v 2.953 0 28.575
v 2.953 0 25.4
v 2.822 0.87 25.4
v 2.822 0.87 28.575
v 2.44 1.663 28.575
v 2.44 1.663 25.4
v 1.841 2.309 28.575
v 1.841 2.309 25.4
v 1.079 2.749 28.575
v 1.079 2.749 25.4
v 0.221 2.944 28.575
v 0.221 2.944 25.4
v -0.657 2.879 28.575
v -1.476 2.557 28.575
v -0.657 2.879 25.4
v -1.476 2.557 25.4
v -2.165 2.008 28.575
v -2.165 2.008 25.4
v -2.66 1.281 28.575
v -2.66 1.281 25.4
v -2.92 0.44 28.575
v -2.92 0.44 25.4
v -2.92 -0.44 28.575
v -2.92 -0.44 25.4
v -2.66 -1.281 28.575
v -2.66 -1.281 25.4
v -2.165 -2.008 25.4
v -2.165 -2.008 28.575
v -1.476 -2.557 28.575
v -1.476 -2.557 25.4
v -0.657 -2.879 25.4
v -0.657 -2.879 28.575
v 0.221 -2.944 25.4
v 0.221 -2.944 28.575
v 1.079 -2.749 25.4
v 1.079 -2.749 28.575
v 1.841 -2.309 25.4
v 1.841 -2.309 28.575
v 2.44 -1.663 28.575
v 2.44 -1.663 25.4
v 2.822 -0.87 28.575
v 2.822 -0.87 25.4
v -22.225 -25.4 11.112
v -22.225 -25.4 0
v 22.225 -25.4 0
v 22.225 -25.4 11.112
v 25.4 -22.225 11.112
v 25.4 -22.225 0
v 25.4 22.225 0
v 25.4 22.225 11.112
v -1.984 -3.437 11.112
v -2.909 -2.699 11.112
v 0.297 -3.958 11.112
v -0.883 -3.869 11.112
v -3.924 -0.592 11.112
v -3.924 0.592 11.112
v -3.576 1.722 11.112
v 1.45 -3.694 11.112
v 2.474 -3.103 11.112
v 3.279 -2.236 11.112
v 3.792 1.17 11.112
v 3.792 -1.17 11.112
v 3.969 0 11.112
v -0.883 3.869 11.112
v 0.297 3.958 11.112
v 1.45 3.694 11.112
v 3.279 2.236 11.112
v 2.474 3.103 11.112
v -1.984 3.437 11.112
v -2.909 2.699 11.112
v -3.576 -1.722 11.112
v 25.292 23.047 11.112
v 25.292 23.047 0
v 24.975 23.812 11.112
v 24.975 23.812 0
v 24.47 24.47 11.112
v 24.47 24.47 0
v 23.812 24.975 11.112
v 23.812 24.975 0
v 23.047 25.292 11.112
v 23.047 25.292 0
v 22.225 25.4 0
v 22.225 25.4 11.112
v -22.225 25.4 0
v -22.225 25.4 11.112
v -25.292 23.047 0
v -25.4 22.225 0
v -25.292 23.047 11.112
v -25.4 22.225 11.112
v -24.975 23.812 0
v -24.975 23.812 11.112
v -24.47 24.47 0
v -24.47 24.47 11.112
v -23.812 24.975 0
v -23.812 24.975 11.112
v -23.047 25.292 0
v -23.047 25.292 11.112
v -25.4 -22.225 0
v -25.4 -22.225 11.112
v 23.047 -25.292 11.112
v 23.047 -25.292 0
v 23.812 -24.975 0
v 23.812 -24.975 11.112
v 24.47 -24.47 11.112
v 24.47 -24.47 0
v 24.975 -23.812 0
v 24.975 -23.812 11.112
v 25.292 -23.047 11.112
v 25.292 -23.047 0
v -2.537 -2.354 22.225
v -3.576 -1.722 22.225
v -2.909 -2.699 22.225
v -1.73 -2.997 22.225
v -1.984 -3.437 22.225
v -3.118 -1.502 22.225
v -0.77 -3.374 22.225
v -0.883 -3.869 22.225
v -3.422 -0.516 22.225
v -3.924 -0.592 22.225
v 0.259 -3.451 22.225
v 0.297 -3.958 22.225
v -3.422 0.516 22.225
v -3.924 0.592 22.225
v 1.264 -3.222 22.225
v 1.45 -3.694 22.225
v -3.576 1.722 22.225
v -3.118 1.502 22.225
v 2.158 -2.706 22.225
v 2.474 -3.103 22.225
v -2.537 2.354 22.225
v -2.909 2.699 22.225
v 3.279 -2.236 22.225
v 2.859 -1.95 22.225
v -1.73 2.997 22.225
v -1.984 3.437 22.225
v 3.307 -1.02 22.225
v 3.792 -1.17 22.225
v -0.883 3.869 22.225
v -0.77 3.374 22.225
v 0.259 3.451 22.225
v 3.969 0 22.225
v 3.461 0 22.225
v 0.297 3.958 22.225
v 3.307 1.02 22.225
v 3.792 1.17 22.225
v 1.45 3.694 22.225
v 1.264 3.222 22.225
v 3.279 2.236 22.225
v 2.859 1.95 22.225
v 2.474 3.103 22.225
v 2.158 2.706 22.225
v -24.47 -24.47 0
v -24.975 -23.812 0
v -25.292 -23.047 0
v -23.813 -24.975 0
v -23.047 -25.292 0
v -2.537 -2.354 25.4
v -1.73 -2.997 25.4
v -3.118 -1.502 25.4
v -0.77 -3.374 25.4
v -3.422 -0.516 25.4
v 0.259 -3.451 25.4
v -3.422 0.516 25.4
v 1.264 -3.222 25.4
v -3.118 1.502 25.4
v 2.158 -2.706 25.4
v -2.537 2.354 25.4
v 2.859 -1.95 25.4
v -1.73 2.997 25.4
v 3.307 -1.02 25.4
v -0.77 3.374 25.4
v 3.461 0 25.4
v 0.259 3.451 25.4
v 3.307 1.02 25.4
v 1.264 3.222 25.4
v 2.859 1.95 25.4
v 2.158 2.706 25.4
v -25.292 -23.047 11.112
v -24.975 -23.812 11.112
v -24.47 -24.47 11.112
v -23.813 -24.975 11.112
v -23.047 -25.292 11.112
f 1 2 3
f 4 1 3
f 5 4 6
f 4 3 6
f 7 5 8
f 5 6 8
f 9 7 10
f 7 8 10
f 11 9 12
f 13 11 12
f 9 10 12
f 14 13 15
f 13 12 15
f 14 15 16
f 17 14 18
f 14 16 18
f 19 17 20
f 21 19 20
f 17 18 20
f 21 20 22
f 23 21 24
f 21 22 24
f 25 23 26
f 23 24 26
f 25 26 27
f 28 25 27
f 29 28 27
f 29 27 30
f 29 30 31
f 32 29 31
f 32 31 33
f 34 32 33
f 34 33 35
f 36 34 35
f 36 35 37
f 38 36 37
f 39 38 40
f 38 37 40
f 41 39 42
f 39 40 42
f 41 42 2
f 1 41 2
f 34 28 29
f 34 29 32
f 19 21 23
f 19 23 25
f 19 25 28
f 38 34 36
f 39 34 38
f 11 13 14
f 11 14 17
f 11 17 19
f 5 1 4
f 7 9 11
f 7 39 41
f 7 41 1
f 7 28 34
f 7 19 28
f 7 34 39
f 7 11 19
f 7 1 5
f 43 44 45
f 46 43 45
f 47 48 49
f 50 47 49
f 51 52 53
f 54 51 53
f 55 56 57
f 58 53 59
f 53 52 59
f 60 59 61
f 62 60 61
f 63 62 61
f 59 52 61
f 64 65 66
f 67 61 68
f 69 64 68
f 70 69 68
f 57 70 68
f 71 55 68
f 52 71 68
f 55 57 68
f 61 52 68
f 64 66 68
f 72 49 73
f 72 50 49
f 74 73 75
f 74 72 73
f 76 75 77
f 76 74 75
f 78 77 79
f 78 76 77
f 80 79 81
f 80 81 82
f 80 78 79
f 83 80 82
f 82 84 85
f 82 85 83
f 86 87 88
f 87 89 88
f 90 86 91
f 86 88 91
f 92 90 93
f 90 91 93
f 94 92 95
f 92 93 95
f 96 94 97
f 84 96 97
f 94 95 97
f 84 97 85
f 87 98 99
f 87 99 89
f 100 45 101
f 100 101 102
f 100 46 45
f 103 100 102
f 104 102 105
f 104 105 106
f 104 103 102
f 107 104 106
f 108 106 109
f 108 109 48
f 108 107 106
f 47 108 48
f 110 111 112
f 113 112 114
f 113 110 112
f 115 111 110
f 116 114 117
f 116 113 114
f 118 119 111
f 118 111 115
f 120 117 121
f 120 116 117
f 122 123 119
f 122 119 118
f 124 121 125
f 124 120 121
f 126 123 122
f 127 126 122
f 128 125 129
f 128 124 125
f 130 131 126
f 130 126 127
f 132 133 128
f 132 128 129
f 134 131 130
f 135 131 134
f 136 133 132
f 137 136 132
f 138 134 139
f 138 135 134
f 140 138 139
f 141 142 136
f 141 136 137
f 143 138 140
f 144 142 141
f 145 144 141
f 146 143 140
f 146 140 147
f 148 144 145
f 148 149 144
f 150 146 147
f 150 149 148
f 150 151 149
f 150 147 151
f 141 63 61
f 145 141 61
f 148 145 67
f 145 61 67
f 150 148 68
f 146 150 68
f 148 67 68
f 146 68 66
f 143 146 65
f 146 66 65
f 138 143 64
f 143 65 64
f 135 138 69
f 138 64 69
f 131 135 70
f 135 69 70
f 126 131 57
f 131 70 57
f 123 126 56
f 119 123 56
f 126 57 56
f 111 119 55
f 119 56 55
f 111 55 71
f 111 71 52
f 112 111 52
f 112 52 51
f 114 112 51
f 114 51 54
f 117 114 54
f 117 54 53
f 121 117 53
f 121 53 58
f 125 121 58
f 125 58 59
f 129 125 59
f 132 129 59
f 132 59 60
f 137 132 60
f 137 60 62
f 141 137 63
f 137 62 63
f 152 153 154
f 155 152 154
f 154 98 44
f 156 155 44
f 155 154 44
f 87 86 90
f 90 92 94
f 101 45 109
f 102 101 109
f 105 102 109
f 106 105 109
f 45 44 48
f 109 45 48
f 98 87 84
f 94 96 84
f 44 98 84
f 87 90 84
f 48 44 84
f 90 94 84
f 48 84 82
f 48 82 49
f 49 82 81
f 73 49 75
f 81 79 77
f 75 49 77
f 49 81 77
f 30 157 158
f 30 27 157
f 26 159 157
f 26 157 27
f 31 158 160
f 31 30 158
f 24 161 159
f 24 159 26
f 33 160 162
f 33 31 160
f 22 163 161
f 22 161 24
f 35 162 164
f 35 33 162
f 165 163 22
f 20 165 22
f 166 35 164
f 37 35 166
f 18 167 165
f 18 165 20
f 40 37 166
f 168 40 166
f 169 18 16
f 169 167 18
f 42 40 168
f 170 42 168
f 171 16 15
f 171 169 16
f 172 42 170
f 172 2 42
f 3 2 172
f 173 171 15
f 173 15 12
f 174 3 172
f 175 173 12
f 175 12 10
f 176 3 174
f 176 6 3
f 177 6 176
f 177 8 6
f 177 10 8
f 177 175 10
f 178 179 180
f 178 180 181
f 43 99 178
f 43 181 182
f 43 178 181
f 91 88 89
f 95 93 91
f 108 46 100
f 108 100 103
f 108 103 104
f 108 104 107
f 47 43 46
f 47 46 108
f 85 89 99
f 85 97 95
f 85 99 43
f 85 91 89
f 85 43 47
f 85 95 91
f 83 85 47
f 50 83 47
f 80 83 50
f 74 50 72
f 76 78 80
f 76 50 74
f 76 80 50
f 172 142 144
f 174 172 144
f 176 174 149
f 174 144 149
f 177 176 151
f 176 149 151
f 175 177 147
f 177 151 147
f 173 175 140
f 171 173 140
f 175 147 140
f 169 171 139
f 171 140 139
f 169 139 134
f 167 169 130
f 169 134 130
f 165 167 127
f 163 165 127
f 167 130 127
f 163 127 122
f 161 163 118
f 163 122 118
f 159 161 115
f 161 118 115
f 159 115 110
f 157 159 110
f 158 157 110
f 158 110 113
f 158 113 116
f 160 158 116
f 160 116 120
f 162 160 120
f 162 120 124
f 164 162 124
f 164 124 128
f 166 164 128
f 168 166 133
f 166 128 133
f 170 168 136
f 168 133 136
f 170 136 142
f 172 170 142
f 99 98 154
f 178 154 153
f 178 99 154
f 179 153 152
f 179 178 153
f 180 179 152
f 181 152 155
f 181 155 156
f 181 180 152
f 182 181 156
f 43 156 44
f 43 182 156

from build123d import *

# Parameters (mm, degrees)
F0_W     = 50.8
F0_H     = 50.8
F1_DEPTH = 11.1125
F2_R     = 3.175
F3_R     = 3.96875
F4_DEPTH = 11.1125
F5_R     = 3.46075
F6_DEPTH = 3.175
F7_R     = 2.95275
F8_DEPTH = 3.175


with BuildPart() as f1:
    # F0 (on Top) → F1 (new body)
    with BuildSketch(Plane.XY):
        Rectangle(F0_W, F0_H)
    extrude(amount=F1_DEPTH)

    # F2
    f2_edges = [f1.edges().sort_by_distance(p)[0] for p in [
        (25.4, -25.4, 5.55625),
        (25.4, 25.4, 5.55625),
        (-25.4, -25.4, 5.55625),
        (-25.4, 25.4, 5.55625),
    ]]
    fillet(f2_edges, radius=F2_R)


with BuildPart() as f4:
    # F3 (on face) → F4 (new body)
    with BuildSketch(Plane.XY.offset(11.1125)):
        Circle(F3_R)
    extrude(amount=F4_DEPTH)

    # F5 (on face) → F6 (join)
    with BuildSketch(Plane.XY.offset(22.225)):
        Circle(F5_R)
    extrude(amount=F6_DEPTH)

    # F7 (on face) → F8 (join)
    with BuildSketch(Plane.XY.offset(25.4)):
        Circle(F7_R)
    extrude(amount=F8_DEPTH)


solid = Compound([f1.part, f4.part])
